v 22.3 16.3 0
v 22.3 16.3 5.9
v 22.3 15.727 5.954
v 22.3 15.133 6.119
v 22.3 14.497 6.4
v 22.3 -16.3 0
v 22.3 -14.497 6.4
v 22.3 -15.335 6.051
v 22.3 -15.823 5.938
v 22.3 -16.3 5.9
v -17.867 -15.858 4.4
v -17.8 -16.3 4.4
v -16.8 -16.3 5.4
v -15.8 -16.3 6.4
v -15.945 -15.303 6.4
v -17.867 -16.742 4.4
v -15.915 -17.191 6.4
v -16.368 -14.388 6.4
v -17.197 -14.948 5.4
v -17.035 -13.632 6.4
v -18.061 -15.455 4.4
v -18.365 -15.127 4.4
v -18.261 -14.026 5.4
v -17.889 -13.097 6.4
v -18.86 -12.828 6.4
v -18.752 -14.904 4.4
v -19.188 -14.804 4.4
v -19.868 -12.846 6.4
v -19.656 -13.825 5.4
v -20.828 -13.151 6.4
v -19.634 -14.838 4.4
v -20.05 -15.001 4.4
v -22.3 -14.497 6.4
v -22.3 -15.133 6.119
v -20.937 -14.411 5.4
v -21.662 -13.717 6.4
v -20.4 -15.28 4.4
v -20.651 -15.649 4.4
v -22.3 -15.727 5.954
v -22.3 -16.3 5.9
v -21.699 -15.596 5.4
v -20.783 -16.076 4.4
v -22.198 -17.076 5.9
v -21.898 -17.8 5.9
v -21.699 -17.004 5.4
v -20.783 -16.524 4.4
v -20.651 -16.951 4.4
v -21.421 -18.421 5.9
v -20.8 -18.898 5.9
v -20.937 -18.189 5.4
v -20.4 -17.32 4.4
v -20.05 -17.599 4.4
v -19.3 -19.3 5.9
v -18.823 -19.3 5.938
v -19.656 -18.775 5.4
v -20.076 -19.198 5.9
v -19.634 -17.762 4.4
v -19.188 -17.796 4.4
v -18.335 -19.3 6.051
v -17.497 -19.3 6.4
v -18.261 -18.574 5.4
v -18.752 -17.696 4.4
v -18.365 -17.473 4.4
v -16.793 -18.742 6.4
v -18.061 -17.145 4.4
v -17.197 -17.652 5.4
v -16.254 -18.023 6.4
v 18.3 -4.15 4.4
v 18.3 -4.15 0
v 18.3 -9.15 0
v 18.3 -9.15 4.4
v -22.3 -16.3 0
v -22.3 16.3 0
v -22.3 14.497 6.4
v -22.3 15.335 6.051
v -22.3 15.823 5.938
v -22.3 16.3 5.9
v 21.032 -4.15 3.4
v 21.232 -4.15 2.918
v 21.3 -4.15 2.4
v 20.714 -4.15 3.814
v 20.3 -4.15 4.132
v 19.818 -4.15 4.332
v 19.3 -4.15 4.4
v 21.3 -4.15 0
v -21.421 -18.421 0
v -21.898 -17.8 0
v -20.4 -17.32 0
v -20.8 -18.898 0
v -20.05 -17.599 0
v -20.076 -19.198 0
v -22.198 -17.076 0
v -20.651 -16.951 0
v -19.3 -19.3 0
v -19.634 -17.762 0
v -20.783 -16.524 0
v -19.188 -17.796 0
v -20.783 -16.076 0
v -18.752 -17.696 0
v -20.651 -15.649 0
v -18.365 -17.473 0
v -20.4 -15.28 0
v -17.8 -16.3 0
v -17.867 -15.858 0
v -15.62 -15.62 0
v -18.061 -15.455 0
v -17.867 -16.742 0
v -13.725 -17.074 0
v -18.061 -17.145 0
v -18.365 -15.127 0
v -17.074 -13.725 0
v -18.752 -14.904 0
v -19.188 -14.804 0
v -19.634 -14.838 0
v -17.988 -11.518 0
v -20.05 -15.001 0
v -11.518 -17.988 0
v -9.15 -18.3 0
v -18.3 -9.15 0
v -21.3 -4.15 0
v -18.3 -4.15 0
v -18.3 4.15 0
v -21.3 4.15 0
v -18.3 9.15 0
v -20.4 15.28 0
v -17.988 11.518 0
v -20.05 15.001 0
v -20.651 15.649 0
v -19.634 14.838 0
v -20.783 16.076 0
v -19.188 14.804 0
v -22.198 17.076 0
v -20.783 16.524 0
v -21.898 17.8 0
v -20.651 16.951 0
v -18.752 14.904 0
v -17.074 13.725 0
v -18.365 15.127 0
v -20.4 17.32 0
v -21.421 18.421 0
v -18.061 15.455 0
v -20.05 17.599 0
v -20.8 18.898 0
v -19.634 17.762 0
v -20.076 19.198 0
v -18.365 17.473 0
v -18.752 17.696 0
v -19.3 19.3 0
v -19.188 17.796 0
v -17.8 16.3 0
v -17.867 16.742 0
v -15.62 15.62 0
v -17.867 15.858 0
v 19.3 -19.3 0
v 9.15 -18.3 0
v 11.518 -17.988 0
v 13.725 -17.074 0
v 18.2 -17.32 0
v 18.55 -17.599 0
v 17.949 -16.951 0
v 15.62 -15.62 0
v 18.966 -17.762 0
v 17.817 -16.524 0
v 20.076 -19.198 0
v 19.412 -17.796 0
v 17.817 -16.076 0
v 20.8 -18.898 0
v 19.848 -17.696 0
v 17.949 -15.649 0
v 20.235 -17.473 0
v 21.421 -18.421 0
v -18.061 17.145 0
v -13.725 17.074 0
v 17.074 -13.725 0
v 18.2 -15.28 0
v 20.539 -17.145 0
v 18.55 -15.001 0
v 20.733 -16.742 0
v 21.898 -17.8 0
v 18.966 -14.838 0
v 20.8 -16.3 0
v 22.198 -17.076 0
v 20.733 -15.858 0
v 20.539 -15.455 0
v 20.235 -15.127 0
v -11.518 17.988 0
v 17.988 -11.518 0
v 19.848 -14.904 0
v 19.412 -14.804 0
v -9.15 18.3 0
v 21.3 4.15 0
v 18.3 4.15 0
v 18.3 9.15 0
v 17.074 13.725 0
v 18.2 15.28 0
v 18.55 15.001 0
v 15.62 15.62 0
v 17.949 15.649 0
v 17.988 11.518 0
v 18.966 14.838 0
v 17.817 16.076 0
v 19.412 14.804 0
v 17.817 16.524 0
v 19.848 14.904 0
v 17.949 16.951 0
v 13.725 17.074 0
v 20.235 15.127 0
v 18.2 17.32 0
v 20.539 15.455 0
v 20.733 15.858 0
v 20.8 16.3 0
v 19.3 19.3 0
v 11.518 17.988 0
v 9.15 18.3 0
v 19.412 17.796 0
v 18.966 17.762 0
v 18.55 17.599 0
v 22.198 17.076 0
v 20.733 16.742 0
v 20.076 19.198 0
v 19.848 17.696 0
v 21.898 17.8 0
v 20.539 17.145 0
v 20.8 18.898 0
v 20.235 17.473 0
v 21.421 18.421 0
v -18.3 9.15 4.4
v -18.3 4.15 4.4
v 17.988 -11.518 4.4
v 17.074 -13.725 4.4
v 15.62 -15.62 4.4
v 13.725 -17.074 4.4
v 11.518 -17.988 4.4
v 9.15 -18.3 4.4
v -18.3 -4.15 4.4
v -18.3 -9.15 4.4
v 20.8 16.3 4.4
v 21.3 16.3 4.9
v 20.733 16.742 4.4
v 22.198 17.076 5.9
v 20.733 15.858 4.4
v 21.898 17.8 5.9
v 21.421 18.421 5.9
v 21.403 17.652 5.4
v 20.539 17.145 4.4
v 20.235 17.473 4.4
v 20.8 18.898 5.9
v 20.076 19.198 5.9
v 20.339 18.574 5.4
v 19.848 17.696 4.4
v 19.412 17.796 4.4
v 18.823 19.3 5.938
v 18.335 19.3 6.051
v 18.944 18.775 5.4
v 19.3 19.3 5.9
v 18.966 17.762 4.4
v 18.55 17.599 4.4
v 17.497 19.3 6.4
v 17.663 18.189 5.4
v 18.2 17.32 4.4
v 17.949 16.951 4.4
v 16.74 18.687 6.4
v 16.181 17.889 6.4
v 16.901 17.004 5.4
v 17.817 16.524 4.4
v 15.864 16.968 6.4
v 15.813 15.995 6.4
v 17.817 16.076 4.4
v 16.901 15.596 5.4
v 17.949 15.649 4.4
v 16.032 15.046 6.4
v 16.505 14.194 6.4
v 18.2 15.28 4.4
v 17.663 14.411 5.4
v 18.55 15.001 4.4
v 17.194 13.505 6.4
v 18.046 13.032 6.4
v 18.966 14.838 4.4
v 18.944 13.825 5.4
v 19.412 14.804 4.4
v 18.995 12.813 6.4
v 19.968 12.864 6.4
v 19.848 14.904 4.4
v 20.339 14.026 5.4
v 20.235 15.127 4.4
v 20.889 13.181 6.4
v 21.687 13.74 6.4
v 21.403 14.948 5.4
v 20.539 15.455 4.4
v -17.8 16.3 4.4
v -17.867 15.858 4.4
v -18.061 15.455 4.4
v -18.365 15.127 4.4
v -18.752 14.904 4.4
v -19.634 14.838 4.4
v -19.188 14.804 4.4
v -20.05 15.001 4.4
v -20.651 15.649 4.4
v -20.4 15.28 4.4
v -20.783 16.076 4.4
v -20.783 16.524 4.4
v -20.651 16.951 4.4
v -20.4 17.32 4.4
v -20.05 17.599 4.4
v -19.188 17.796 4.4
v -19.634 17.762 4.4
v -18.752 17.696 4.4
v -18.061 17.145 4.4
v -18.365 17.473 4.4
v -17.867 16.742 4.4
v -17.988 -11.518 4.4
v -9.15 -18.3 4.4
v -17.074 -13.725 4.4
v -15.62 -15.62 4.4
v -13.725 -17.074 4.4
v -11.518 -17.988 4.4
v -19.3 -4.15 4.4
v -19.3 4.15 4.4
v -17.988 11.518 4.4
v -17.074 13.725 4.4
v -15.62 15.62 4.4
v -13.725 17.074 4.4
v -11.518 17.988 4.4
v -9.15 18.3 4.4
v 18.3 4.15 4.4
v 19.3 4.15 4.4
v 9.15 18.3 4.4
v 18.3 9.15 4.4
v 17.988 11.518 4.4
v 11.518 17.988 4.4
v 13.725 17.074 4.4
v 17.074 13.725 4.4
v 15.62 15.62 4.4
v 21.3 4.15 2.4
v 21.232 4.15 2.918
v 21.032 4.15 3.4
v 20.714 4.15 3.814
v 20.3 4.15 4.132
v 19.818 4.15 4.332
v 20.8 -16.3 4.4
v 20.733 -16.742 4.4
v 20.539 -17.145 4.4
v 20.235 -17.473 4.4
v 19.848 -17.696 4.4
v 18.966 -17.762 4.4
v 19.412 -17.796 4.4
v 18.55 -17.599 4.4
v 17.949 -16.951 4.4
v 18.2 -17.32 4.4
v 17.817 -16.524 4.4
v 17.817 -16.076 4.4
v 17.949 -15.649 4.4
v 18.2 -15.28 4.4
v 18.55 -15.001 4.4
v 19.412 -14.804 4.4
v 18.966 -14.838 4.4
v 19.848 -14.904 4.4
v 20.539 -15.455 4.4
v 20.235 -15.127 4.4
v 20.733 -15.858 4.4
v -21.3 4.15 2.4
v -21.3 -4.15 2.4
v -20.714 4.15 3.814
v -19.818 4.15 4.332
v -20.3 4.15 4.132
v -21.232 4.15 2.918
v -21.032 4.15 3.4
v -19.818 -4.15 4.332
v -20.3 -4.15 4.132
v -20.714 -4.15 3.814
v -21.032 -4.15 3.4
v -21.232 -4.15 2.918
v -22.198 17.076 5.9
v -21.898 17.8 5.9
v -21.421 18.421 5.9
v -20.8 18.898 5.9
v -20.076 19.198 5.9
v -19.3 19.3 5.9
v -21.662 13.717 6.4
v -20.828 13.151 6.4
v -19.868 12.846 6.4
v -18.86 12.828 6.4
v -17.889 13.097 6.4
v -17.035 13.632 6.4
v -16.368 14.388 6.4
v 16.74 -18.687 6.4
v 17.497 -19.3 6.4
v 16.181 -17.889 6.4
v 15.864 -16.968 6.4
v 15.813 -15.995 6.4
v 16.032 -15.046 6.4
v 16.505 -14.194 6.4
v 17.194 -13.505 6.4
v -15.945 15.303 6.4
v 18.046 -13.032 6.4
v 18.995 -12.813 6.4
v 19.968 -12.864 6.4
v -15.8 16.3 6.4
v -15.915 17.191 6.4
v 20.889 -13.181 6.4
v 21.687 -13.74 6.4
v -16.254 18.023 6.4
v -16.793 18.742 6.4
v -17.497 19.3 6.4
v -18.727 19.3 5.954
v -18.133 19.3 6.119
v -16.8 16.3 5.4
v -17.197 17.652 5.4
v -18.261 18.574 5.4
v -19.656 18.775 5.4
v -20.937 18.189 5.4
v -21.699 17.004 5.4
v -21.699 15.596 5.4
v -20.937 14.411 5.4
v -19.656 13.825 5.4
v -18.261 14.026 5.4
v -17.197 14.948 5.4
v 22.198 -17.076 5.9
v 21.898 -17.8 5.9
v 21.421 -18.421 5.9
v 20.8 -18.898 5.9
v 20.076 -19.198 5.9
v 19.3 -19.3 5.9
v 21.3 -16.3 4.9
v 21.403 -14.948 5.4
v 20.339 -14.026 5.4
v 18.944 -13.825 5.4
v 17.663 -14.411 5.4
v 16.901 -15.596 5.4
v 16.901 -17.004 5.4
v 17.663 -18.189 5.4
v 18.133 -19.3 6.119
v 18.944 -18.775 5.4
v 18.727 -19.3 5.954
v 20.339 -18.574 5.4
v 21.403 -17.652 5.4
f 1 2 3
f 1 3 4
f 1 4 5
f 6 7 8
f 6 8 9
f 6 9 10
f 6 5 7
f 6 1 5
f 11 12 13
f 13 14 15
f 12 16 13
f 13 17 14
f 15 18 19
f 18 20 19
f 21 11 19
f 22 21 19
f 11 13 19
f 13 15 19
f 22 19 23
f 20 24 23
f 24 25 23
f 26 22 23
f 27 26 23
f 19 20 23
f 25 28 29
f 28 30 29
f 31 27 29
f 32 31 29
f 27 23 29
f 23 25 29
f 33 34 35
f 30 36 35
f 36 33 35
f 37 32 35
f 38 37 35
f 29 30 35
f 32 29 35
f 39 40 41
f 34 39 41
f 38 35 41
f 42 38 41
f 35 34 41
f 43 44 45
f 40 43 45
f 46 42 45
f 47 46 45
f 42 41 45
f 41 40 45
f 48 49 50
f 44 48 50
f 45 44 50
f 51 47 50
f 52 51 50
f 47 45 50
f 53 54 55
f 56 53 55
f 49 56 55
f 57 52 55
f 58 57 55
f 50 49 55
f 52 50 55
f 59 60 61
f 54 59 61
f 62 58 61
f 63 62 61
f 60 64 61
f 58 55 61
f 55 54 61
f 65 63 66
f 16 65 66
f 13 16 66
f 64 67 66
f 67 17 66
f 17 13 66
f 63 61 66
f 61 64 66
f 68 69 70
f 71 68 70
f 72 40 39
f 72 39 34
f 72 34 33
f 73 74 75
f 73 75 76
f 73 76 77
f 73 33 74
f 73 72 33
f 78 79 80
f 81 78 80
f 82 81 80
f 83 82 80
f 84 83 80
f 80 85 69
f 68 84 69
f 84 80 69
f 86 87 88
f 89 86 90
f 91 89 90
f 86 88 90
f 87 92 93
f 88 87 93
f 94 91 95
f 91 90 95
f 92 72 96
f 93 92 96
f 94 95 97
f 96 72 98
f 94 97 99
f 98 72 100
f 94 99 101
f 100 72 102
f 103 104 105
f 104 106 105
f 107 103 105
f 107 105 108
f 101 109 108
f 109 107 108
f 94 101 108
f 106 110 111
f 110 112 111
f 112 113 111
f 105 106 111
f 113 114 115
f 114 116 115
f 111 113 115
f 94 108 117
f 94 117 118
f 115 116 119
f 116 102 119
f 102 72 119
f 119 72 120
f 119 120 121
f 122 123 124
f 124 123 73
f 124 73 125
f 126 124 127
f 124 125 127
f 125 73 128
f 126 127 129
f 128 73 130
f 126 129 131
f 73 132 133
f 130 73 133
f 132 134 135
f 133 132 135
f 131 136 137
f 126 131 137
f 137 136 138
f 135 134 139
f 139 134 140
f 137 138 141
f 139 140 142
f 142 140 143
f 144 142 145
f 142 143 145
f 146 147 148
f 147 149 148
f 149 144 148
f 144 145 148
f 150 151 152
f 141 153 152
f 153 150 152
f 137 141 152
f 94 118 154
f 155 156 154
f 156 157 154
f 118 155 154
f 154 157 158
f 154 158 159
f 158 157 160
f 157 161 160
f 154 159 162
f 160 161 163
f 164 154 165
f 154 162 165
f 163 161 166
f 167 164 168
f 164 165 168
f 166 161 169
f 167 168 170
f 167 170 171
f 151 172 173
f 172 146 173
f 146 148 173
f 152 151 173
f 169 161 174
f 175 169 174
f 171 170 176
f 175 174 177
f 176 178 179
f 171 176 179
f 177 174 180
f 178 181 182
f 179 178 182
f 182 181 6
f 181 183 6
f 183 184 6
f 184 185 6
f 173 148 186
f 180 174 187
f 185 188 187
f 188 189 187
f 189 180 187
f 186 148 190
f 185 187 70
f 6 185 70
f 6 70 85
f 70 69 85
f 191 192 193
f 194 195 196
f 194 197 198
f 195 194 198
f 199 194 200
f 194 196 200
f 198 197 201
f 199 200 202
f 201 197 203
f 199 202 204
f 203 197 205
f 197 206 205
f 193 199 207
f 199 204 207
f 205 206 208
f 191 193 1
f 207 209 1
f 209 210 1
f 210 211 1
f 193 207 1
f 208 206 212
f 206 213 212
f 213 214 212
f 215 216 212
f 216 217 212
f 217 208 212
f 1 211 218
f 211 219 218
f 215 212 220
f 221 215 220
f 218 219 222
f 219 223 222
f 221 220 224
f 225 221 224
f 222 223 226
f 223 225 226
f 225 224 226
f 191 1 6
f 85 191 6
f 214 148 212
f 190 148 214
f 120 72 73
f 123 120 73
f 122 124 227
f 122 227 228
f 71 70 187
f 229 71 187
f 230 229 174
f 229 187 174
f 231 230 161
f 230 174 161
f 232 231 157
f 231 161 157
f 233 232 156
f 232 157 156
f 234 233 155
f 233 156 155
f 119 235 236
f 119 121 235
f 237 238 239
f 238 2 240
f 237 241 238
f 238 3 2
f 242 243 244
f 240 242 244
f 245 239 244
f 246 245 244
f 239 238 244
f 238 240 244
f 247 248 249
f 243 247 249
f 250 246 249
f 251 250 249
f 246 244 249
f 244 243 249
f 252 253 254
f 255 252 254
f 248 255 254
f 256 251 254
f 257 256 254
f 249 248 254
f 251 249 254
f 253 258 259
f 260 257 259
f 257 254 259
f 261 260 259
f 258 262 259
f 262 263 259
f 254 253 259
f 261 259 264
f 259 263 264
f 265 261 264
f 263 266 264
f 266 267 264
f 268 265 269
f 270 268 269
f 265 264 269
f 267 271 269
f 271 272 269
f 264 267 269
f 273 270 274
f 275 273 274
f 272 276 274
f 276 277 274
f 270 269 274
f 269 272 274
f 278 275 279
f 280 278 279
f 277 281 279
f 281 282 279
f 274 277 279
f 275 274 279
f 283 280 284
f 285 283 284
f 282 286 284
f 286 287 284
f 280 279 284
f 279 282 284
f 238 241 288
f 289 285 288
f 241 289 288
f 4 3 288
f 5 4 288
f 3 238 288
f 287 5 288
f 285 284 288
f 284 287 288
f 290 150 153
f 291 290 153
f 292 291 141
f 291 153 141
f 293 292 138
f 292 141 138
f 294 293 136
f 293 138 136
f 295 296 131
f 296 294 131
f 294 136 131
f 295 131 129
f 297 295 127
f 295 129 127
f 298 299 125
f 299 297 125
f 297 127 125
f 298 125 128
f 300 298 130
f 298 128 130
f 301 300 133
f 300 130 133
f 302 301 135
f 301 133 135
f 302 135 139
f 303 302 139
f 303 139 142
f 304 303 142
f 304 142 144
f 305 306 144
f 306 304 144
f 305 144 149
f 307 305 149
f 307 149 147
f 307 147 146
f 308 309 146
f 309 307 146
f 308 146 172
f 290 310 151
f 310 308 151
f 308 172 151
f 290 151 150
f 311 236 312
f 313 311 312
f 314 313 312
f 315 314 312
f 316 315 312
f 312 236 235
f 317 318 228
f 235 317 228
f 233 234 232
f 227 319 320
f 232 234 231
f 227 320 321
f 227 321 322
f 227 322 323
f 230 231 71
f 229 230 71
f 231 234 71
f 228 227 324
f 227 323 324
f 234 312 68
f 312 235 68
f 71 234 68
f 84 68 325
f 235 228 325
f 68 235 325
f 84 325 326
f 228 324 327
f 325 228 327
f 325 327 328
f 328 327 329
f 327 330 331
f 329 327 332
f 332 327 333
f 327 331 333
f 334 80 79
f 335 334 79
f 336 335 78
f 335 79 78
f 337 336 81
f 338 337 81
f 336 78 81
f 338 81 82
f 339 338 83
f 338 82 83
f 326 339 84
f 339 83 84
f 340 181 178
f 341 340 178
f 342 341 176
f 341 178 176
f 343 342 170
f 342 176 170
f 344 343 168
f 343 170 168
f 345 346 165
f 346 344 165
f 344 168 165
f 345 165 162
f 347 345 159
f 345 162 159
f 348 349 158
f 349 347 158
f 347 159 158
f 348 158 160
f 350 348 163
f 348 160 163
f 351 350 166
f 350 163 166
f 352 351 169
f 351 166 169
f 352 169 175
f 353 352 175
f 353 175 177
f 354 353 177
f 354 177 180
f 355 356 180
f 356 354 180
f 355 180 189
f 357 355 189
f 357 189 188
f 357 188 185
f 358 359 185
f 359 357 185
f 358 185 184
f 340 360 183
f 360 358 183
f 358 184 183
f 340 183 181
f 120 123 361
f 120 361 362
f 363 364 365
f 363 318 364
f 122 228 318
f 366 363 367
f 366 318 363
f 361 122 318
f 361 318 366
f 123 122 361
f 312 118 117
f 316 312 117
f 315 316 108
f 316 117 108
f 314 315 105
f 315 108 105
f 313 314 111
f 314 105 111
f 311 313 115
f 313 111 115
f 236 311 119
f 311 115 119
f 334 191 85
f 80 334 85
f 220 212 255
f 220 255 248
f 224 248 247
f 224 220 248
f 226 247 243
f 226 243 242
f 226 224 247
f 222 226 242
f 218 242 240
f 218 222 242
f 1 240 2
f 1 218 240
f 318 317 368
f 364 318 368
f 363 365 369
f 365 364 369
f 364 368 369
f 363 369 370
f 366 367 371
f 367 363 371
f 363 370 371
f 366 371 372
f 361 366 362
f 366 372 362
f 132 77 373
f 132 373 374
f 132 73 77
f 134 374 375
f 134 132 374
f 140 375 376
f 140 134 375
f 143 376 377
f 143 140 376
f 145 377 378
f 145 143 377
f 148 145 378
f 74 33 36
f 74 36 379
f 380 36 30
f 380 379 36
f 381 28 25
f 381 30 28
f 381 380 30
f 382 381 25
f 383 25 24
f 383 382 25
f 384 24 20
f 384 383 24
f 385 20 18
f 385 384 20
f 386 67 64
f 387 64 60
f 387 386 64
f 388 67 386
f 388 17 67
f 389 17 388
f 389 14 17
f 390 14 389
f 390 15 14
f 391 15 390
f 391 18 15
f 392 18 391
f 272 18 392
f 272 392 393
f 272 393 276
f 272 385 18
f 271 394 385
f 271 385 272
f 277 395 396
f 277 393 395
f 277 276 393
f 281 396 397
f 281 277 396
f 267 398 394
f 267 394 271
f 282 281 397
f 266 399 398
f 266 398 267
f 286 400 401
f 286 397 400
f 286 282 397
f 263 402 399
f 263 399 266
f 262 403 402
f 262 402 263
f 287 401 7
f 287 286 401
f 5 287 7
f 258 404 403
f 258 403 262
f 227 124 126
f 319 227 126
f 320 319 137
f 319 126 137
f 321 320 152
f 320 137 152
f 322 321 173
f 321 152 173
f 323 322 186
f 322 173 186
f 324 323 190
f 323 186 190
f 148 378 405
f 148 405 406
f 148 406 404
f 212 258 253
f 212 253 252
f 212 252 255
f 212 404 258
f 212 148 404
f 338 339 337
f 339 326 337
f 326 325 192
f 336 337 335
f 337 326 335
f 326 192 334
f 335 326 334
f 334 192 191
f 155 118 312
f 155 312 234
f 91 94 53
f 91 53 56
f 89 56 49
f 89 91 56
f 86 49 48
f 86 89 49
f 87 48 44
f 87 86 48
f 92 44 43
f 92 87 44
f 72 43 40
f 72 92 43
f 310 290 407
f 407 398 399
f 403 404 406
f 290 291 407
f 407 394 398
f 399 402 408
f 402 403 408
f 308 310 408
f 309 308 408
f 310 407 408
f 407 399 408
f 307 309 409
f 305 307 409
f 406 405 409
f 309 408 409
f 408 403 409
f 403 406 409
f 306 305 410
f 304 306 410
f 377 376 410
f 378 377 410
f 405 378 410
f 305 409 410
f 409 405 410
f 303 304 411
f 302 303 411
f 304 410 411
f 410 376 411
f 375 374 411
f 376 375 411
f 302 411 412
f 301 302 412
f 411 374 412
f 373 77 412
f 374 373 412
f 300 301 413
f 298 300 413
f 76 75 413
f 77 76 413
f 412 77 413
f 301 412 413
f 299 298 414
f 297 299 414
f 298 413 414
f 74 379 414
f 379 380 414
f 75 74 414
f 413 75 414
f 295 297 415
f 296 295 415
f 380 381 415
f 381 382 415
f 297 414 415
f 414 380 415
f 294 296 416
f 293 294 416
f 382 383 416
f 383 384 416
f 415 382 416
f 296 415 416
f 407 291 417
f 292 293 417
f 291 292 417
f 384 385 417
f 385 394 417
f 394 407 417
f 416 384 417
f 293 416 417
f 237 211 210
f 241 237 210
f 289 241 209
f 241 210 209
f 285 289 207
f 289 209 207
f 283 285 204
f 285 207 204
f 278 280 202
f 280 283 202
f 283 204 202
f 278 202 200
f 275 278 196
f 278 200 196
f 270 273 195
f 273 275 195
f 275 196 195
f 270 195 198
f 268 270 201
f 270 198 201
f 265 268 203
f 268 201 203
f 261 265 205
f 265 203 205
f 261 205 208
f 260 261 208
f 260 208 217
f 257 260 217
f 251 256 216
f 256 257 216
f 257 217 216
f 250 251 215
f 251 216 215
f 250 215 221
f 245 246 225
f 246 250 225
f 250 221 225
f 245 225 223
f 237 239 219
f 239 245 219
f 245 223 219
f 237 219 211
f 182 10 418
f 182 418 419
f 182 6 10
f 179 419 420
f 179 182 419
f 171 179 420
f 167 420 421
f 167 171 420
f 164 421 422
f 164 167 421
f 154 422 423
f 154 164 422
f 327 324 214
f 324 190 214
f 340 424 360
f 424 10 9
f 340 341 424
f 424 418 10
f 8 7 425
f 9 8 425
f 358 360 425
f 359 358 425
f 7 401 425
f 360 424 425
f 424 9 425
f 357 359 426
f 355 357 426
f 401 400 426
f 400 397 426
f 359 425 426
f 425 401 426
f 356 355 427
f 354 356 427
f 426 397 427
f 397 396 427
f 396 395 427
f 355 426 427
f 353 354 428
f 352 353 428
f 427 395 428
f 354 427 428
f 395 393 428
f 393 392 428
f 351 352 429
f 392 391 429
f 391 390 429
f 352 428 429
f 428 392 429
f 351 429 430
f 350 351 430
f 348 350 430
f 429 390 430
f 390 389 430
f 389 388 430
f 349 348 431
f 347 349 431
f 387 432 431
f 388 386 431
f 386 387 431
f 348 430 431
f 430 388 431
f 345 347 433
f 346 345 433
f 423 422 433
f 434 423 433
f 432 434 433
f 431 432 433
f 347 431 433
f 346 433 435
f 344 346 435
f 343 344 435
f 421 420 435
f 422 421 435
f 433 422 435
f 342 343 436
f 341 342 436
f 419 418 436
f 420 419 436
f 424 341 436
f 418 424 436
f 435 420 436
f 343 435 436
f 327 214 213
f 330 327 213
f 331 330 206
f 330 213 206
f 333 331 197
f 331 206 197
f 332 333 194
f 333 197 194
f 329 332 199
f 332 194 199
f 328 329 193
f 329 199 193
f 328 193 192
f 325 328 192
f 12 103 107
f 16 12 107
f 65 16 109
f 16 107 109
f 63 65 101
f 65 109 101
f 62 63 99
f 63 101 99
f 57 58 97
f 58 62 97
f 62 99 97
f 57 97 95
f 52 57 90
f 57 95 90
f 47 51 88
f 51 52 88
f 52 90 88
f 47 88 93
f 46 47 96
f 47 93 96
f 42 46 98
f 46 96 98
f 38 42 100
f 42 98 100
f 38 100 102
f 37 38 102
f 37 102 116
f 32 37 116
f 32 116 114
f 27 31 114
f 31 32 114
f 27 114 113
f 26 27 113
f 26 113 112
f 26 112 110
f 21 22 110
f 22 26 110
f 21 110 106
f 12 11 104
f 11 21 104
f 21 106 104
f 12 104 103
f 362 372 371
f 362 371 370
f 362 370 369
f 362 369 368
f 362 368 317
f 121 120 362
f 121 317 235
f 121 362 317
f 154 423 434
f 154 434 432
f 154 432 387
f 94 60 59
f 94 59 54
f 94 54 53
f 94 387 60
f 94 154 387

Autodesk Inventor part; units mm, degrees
ref_plane "YZ Plane" through (0, 0, 0) normal (1, 0, 0) x (0, 1, 0)
ref_plane "XZ Plane" through (0, 0, 0) normal (0, 1, 0) x (-1, 0, 0)
ref_plane "XY Plane" through (0, 0, 0) normal (0, 0, 1) x (1, 0, 0)
sketch "Эскиз1" plane through (0, 0, 0) normal (0, 0, 1) x (1, 0, 0)
  arc A0 (19.3, -19.3) -> (22.3, -16.3) centre (19.3, -16.3) ccw
  line L0 (19.3, -19.3) -> (-19.3, -19.3)
  arc A1 (-22.3, -16.3) -> (-19.3, -19.3) centre (-19.3, -16.3) ccw
  line L1 (-22.3, -16.3) -> (-22.3, 16.3)
  arc A2 (-19.3, 19.3) -> (-22.3, 16.3) centre (-19.3, 16.3) ccw
  line L2 (-19.3, 19.3) -> (19.3, 19.3)
  arc A3 (22.3, 16.3) -> (19.3, 19.3) centre (19.3, 16.3) ccw
  line L3 (22.3, 16.3) -> (22.3, -16.3)
  circle A4 centre (-19.3, 16.3) radius 2 construction
  circle A5 centre (19.3, 16.3) radius 2 construction
  circle A6 centre (19.3, -16.3) radius 2 construction
  circle A7 centre (-19.3, -16.3) radius 2 construction
  arc A8 (14.15, 1.4869) -> (1.4869, 14.15) centre (9.15, 9.15) ccw
  line L4 (1.4869, 14.15) -> (-1.4869, 14.15)
  arc A9 (-1.4869, 14.15) -> (-14.15, 1.4869) centre (-9.15, 9.15) ccw
  line L5 (-14.15, 1.4869) -> (-14.15, -1.4869)
  arc A10 (-14.15, -1.4869) -> (-1.4869, -14.15) centre (-9.15, -9.15) ccw
  line L6 (-1.4869, -14.15) -> (1.4869, -14.15)
  arc A11 (1.4869, -14.15) -> (14.15, -1.4869) centre (9.15, -9.15) ccw
  line L7 (14.15, -1.4869) -> (14.15, 1.4869)
  line L8 (-9.15, 9.15) -> (-18.3, 9.15) construction
  line L9 (-22.3, 0) -> (22.3, 0) construction
  line L10 (0, 19.3) -> (0, -19.3) construction
  line L11 (-9.15, -9.15) -> (-18.3, -9.15) construction
  line L12 (-9.15, 9.15) -> (-9.15, 18.3) construction
  line L13 (9.15, 9.15) -> (9.15, 18.3) construction
  line L14 (-18.3, 9.15) -> (-18.3, -9.15)
  line L15 (-9.15, 18.3) -> (9.15, 18.3)
  line L16 (-9.15, -18.3) -> (9.15, -18.3)
  line L17 (18.3, 9.15) -> (18.3, -9.15)
  line L18 (-18.3, 9.15) -> (-18.3, 4.15) construction
  line L19 (-18.3, -9.15) -> (-18.3, -4.15) construction
  line L20 (-18.3, 4.15) -> (-21.3, 4.15)
  line L21 (-21.3, 4.15) -> (-21.3, -4.15)
  line L22 (-21.3, -4.15) -> (-18.3, -4.15)
  line L23 (-18.3, -4.15) -> (-18.3, 4.15)
  line L24 (18.3, 4.15) -> (21.3, 4.15)
  line L25 (21.3, 4.15) -> (21.3, -4.15)
  line L26 (21.3, -4.15) -> (18.3, -4.15)
  line L27 (18.3, -4.15) -> (18.3, 4.15)
  circle A12 centre (-19.3, 16.3) radius 1.5
  circle A13 centre (19.3, 16.3) radius 1.5
  circle A14 centre (19.3, -16.3) radius 1.5
  circle A15 centre (-19.3, -16.3) radius 1.5
  dimension "d0" = 5
  dimension "d1" = 5
  dimension "d2" = 3
  dimension "d3" = 8.3
  dimension "d4" = 3
  dimension "d5" = 3
  dimension "d6" = 3
  dimension "d7" = 3
extrude "Выдавливание1" add sketch "Эскиз1" along normal blind 6.4 contours L0 A1 L1 A2 L2 A3 L3 A0 | L7 A11 L6 A10 L5 A9 L4 A8 | A8 L17 A11 L7 | A8 L4 A9 L15 | L24 L25 L26 L17 | L16 A10 L6 A11 | A9 L5 A10 L14 | L14 L22 L21 L20
extrude "Выдавливание2" cut sketch "Эскиз1" along normal blind 4.4 contours L7 A11 L6 A10 L5 A9 L4 A8 | A8 L17 A11 L7 | A8 L4 A9 L15 | L24 L25 L26 L17 | L16 A10 L6 A11 | A9 L5 A10 L14 | L14 L22 L21 L20
chamfer "Фаска1" distance 2 angle 45 4 edges at (17.8, 16.3, 6.4) (17.8, -16.3, 6.4) (-20.8, -16.3, 6.4) (-20.8, 16.3, 6.4)
fillet "Сопряжение1" radius 2 2 edges at (-21.3, 0, 4.4) (21.3, 0, 4.4)
properties part number "akkum_cap_bms"
